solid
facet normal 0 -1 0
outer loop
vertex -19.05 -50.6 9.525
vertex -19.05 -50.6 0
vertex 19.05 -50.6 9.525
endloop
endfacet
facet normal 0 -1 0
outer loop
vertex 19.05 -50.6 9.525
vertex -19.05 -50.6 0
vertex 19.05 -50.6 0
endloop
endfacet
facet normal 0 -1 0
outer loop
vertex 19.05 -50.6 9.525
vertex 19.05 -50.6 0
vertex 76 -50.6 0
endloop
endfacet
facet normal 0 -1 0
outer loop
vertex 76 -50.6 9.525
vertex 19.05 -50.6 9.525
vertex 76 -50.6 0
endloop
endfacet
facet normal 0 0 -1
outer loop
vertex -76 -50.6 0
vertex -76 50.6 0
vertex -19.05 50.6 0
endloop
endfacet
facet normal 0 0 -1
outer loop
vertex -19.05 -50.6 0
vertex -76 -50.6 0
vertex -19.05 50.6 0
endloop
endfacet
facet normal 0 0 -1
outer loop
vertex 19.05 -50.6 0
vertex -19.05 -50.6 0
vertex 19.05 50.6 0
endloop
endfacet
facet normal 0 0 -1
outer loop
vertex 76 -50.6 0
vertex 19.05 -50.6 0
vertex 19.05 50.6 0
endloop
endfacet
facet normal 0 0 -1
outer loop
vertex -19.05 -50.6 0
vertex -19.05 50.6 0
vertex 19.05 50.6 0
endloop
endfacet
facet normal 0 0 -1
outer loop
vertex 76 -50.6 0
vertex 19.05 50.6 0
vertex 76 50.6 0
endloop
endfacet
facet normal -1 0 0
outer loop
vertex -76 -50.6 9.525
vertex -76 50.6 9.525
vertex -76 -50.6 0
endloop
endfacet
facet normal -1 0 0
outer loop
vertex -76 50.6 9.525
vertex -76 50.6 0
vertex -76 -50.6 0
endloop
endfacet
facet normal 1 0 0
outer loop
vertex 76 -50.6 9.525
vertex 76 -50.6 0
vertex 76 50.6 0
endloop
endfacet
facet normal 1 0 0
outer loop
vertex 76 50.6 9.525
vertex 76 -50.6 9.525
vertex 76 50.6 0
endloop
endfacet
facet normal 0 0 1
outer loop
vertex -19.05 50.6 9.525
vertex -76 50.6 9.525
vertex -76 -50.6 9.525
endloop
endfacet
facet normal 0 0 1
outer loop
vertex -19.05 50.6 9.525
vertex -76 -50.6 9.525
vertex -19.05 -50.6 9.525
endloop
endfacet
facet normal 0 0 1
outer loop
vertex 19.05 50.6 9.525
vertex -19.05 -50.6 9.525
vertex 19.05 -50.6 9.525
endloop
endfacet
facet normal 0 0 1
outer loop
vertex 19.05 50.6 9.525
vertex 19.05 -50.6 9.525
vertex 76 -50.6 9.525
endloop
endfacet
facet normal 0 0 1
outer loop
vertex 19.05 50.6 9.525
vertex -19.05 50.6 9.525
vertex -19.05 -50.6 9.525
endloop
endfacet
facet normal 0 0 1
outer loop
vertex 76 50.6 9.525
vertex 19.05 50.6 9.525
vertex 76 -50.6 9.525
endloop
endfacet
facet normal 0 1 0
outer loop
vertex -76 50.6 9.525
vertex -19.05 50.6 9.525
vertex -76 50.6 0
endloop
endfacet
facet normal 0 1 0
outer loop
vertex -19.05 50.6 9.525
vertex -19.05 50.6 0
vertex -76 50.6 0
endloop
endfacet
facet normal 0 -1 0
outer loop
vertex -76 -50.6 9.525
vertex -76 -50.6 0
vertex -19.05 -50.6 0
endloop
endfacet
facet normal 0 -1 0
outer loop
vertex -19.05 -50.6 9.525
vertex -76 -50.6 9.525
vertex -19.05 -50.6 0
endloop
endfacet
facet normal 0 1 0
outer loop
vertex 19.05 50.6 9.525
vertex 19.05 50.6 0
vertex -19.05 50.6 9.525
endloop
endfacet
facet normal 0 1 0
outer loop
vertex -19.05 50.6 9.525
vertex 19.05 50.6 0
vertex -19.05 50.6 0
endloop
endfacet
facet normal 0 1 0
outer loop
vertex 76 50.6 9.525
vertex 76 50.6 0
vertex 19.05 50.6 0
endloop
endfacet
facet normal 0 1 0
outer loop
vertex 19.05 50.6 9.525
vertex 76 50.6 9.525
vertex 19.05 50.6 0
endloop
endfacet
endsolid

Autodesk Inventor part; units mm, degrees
ref_plane "YZ Plane" through (0, 0, 0) normal (1, 0, 0) x (0, 1, 0)
ref_plane "XZ Plane" through (0, 0, 0) normal (0, 1, 0) x (-1, 0, 0)
ref_plane "XY Plane" through (0, 0, 0) normal (0, 0, 1) x (1, 0, 0)
ref_plane "Work Plane1" through (0, 0, 0) normal (0, 0, 1) x (1, 0, 0)
sketch "Sketch1" plane through (0, 0, 0) normal (0, 0, 1) x (1, 0, 0)
  line L0 (-63.5, -38.1) -> (-63.5, 38.1) construction
  line L1 (-19.05, -38.1) -> (-63.5, -38.1) construction
  line L2 (19.05, -38.1) -> (-19.05, -38.1) construction
  line L3 (63.5, -38.1) -> (19.05, -38.1) construction
  line L4 (63.5, 38.1) -> (63.5, -38.1) construction
  line L5 (19.05, 38.1) -> (63.5, 38.1) construction
  line L6 (-19.05, 38.1) -> (19.05, 38.1) construction
  line L7 (-63.5, 38.1) -> (-19.05, 38.1) construction
  line L8 (-76, 50.6) -> (-76, -50.6)
  line L9 (-76, -50.6) -> (-19.05, -50.6)
  line L10 (-19.05, -50.6) -> (19.05, -50.6)
  line L11 (19.05, -50.6) -> (76, -50.6)
  line L12 (76, -50.6) -> (76, 50.6)
  line L13 (76, 50.6) -> (19.05, 50.6)
  line L14 (19.05, 50.6) -> (-19.05, 50.6)
  line L15 (-19.05, 50.6) -> (-76, 50.6)
  point P0 (0, 0)
  dimension "d0" = 12.5
extrude "Extrusion1" add sketch "Sketch1" along normal blind 9.525
properties part number "speaker-base-sorbothane" material "Rubber"
